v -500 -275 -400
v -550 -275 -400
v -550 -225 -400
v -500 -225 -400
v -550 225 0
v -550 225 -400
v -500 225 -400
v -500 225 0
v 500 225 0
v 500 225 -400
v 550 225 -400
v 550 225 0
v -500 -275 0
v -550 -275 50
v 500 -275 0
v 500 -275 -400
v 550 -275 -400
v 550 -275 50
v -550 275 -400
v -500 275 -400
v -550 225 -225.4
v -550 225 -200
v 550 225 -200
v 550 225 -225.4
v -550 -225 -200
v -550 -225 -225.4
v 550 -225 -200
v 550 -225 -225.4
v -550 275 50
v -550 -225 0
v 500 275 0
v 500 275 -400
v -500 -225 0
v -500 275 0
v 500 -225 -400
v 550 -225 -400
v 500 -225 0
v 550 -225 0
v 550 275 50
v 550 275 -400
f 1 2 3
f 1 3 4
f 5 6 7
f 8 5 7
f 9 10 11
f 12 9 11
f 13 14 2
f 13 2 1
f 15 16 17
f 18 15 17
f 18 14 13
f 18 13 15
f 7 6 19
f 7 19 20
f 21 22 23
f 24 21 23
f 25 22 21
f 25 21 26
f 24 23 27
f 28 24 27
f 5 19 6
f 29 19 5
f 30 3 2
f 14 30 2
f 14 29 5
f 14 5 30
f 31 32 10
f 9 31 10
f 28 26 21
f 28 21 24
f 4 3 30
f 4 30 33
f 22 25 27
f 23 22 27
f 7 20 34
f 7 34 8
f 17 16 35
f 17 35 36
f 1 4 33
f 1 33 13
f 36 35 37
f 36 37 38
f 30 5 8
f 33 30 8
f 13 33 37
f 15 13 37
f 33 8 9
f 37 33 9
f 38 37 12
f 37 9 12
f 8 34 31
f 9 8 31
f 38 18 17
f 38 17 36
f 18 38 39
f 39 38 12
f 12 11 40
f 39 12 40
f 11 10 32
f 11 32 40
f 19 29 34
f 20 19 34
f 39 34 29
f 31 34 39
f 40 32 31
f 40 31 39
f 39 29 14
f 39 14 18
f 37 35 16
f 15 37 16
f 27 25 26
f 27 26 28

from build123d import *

# Parameters (mm, degrees)
F0_W     = 1100
F0_H     = 550
F1_DEPTH = 50
F2_W     = 50
F2_H     = 50
F3_DEPTH = 400
F5_W     = 1100
F5_H     = 450
F6_DEPTH = 25.4


with BuildPart() as f1:
    # F0 (on Top) → F1 (new body)
    with BuildSketch(Plane.XY):
        Rectangle(F0_W, F0_H)
    extrude(amount=F1_DEPTH)

    # F2 (on face) → F3 (join)
    with BuildSketch(Plane(origin=(0, 0, 0), x_dir=(1, 0, 0), z_dir=(0, 0, -1))):
        with Locations((-525, 250)):
            Rectangle(F2_W, F2_H)
        with Locations((-525, -250)):
            Rectangle(F2_W, F2_H)
        with Locations((525, -250)):
            Rectangle(F2_W, F2_H)
        with Locations((525, 250)):
            Rectangle(F2_W, F2_H)
    extrude(amount=F3_DEPTH)


with BuildPart() as f6:
    # F5 (on offset) → F6 (new body)
    with BuildSketch(Plane(origin=(0, 0, -200), x_dir=(1, 0, 0), z_dir=(0, 0, -1))):
        Rectangle(F5_W, F5_H)
    extrude(amount=F6_DEPTH)


solid = Compound([f1.part, f6.part])
